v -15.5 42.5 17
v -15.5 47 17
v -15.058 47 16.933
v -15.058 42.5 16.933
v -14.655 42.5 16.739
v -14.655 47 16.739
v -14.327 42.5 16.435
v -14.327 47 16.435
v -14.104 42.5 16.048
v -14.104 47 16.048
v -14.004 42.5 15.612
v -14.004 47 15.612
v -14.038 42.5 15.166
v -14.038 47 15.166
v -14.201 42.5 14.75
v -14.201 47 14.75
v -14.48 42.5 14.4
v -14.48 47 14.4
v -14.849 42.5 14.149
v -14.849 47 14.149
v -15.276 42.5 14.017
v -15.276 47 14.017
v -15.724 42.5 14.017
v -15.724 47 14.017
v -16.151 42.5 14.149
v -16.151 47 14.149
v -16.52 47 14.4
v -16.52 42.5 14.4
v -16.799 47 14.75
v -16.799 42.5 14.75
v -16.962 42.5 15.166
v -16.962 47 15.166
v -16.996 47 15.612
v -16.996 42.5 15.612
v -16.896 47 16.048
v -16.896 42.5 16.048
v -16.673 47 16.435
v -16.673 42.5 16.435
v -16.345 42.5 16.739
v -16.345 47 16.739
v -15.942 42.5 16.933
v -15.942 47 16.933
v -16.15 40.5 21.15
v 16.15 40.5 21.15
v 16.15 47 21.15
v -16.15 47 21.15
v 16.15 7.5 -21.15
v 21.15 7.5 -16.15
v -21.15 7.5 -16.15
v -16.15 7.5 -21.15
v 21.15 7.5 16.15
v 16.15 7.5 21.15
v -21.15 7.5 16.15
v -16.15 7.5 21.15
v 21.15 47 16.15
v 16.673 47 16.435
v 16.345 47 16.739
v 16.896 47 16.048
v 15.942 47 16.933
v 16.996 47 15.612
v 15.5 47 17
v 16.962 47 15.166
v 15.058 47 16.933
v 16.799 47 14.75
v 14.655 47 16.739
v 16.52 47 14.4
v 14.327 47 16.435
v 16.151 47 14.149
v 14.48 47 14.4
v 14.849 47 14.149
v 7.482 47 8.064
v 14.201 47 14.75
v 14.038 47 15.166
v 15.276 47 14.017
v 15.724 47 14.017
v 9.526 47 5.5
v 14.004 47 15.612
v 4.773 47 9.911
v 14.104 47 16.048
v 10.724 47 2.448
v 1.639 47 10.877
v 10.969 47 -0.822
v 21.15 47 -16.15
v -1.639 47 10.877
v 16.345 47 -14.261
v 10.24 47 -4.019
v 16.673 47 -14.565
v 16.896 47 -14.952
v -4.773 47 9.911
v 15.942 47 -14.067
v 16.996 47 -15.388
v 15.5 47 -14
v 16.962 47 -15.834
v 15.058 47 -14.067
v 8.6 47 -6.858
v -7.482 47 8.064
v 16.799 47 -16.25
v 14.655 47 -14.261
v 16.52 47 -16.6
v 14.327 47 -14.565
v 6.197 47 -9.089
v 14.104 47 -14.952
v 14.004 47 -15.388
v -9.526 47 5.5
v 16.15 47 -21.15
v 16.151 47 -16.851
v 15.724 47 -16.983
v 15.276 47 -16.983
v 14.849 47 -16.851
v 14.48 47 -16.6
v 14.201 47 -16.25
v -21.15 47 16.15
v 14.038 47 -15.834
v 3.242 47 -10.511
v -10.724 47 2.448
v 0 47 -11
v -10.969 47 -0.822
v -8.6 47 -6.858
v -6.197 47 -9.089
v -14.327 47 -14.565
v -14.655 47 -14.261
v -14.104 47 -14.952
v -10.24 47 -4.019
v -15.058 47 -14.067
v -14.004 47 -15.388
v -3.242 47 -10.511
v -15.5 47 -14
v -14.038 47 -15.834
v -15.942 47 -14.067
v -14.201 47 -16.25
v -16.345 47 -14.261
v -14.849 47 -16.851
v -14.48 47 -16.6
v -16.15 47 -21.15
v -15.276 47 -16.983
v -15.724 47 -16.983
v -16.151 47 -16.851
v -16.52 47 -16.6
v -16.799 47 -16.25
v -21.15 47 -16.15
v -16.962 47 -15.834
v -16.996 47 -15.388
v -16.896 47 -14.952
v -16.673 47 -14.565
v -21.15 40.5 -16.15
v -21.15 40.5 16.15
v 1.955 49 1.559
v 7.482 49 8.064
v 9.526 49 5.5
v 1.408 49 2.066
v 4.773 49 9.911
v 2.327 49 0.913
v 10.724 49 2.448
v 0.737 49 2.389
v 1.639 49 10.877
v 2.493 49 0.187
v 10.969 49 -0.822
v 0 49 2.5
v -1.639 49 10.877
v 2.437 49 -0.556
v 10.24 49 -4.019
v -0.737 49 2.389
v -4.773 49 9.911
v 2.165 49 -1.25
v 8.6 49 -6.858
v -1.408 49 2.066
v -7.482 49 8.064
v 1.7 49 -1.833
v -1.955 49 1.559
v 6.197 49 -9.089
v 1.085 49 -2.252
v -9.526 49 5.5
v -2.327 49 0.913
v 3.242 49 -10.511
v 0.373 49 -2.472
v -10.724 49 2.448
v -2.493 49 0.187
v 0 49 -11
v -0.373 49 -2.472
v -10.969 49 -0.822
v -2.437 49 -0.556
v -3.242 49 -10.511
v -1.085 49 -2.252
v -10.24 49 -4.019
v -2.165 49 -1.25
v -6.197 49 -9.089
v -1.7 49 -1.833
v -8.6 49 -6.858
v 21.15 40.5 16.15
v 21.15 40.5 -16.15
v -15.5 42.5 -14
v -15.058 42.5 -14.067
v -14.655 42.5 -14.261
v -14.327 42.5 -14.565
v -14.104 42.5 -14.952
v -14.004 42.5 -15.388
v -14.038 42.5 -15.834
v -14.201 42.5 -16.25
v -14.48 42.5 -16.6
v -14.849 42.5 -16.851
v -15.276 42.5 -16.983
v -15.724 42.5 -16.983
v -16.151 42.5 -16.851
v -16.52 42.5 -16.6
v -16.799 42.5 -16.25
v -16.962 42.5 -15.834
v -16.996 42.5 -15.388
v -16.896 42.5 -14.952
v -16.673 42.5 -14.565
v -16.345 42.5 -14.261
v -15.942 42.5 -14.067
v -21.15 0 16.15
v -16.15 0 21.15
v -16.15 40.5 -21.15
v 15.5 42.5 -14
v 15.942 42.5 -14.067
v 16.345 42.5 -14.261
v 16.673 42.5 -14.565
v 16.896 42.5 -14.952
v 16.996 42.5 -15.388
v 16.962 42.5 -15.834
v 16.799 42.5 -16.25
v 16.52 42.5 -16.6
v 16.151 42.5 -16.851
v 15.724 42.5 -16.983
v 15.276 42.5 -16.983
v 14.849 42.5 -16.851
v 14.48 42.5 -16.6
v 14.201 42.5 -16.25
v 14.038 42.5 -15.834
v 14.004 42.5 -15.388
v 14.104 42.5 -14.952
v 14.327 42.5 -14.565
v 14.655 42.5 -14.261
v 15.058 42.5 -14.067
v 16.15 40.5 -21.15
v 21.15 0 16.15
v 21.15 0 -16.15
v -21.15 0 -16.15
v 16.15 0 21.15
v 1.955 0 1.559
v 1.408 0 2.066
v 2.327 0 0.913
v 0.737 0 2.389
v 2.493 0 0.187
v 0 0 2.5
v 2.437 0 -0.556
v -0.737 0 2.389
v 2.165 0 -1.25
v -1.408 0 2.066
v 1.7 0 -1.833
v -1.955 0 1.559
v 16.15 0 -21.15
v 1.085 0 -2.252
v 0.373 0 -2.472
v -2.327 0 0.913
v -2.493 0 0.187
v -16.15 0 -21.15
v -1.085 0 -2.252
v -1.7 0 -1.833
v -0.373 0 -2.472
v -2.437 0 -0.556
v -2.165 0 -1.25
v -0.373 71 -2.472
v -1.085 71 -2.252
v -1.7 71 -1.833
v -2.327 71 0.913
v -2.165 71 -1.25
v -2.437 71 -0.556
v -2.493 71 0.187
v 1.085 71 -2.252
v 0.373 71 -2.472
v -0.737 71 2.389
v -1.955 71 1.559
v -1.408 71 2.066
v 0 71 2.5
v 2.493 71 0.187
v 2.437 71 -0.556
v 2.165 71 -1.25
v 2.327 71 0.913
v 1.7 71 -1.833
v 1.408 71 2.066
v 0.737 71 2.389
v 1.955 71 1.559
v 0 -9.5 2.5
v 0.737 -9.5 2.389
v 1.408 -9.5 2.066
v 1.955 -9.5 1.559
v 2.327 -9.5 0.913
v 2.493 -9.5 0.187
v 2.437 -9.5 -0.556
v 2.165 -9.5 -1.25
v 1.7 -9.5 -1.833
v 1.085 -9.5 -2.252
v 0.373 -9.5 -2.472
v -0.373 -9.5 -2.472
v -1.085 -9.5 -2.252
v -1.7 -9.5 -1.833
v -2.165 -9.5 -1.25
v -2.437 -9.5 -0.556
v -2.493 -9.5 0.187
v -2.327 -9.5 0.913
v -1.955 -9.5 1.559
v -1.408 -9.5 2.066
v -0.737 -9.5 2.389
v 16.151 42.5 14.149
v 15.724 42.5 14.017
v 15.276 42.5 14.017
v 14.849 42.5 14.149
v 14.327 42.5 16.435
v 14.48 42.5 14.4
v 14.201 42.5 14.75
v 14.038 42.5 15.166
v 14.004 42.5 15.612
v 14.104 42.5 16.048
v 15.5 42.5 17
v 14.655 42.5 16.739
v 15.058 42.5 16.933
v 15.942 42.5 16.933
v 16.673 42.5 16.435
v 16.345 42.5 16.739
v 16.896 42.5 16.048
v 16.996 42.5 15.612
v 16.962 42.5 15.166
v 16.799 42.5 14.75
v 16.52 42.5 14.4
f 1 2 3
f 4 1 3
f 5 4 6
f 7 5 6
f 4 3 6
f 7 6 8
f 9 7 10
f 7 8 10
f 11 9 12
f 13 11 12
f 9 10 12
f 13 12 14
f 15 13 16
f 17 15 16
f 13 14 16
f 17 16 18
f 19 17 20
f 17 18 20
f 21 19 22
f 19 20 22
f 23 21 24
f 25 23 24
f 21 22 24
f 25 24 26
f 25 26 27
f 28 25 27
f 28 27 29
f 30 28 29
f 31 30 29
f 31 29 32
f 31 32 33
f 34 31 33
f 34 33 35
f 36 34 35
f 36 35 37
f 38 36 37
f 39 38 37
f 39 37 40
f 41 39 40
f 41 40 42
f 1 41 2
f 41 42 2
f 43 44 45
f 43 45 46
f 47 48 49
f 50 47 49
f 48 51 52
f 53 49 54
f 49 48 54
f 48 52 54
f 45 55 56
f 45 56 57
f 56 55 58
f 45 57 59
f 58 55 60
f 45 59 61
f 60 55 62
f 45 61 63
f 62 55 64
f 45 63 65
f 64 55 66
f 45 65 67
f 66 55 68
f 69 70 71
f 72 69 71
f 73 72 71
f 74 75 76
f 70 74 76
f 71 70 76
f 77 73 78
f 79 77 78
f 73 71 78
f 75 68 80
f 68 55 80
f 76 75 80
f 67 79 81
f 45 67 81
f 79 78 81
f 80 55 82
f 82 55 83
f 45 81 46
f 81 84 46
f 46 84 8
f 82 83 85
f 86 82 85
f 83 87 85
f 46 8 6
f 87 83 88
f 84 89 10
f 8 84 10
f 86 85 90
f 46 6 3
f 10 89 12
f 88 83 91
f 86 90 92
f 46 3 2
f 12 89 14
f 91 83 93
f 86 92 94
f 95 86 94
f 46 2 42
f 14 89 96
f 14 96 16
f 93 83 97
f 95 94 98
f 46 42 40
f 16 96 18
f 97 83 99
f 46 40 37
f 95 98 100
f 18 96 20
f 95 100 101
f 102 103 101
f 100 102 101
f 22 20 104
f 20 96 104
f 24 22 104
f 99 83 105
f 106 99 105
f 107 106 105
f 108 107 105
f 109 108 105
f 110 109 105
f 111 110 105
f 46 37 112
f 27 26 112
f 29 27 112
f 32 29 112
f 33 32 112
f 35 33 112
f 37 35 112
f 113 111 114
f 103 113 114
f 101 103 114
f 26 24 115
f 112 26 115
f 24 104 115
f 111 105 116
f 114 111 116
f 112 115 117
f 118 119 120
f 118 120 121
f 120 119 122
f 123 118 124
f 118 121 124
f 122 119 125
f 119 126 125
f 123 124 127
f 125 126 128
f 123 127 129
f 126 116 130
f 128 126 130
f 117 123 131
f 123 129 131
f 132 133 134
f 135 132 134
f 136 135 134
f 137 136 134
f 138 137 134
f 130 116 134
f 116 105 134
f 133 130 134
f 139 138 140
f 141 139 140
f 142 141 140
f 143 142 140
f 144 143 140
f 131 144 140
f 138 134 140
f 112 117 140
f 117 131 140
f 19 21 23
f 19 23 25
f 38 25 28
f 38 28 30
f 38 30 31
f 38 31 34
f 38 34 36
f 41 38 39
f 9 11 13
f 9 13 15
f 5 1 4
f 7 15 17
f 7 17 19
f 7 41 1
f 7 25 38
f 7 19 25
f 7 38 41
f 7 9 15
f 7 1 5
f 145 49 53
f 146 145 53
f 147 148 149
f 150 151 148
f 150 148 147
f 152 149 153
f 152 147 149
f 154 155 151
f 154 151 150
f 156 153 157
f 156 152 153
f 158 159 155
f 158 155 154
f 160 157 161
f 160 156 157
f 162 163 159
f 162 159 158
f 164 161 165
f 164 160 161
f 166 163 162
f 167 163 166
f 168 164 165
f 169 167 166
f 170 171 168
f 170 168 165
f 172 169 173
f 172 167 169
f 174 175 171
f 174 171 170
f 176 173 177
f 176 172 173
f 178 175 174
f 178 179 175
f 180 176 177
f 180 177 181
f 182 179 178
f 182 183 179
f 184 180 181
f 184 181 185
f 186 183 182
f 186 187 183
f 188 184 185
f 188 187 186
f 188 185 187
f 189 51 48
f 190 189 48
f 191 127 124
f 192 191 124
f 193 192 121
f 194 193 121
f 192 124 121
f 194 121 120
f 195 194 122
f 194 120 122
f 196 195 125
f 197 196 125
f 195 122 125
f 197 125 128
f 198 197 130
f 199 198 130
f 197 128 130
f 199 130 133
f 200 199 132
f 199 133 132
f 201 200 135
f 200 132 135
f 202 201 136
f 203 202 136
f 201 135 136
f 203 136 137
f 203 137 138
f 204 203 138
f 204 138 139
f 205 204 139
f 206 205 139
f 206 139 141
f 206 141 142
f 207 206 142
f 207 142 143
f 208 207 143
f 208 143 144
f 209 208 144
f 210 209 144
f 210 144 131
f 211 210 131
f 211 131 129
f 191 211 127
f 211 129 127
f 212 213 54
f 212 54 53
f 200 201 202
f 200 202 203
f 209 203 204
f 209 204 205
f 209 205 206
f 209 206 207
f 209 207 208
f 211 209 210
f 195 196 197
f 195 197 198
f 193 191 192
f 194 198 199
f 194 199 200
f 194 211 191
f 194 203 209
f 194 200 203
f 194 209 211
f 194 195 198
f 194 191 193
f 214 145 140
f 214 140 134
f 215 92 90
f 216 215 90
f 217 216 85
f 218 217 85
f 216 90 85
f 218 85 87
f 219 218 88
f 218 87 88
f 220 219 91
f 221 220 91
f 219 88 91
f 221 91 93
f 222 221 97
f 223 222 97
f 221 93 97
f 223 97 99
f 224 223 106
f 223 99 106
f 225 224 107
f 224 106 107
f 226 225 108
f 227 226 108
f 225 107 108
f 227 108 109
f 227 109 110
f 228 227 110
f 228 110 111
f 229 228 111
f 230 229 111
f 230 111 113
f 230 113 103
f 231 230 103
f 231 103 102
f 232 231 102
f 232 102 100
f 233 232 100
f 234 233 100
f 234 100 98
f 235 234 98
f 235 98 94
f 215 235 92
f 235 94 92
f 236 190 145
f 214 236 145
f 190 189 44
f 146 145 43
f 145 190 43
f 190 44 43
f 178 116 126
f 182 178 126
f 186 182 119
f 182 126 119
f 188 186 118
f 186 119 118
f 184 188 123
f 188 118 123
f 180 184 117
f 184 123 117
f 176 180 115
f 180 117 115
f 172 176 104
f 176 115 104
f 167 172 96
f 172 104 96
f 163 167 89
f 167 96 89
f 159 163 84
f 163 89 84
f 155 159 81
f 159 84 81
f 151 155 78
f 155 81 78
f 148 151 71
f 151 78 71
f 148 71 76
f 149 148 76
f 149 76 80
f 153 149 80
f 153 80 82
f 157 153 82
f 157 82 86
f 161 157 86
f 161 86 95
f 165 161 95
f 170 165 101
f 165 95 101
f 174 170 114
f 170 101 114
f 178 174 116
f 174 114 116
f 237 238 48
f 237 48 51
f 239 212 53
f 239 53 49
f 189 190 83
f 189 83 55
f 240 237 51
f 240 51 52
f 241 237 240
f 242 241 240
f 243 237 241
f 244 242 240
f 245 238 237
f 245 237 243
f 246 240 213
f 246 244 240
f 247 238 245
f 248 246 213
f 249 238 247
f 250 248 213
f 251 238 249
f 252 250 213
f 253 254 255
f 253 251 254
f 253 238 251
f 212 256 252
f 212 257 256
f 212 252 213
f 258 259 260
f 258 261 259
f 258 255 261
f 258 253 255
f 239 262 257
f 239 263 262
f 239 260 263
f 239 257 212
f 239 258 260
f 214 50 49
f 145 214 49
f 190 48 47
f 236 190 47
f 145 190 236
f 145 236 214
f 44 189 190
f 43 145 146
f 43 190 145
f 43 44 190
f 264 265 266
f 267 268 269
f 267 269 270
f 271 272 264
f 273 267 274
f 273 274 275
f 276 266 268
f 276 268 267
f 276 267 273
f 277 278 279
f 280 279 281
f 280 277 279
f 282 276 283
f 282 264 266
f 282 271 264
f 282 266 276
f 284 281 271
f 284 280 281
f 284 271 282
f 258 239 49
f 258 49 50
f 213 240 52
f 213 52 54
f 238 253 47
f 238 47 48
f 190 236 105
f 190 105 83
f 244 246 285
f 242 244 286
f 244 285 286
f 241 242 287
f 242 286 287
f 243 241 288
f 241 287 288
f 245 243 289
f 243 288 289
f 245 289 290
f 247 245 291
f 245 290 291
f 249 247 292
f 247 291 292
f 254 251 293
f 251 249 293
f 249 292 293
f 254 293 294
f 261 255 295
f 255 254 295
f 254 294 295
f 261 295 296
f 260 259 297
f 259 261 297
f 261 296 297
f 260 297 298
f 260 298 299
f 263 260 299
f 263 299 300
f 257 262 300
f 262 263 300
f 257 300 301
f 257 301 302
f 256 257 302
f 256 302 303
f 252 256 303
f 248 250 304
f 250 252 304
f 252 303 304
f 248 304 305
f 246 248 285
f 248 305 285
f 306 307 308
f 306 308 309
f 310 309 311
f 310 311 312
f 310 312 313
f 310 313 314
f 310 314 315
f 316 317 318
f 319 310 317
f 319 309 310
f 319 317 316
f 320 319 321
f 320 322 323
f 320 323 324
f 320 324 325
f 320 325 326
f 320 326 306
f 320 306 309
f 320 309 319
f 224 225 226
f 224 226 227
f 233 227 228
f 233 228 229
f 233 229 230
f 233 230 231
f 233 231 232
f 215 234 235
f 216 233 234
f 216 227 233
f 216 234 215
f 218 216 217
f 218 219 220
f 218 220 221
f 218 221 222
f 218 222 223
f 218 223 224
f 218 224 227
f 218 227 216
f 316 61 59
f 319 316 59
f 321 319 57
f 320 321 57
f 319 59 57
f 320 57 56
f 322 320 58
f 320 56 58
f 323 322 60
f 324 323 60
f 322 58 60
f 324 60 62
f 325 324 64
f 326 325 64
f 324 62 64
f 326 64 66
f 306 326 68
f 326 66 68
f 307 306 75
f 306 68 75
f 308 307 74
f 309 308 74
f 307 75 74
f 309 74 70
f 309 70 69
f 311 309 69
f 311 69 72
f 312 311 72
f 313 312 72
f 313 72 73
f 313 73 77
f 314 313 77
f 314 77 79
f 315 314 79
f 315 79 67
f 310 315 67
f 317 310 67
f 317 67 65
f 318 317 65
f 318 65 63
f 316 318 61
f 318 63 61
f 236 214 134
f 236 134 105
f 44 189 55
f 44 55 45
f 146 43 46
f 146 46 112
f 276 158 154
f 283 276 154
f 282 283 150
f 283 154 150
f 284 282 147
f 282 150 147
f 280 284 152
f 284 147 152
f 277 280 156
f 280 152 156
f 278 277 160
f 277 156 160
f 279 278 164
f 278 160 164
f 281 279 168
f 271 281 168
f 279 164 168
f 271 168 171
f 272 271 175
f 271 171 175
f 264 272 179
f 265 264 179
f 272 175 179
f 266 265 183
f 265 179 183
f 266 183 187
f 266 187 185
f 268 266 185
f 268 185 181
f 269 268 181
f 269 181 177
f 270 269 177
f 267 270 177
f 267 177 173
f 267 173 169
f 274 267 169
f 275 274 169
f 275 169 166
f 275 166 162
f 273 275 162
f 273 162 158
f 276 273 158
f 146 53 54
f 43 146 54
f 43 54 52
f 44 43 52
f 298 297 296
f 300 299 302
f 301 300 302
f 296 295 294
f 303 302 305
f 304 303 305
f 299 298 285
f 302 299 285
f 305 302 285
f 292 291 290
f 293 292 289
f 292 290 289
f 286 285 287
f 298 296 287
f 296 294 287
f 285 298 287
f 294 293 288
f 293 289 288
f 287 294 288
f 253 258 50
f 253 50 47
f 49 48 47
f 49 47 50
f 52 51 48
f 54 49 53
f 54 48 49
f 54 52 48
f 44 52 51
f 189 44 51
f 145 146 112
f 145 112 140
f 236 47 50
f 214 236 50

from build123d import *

# Parameters (mm, degrees)
EXTRUDE1_DEPTH      = 47
SKETCH2_R           = 11
EXTRUDE2_DEPTH      = 2
EXTRUDE3_START      = -9.5
SKETCH3_R           = 2.5
EXTRUDE3_DEPTH      = 80.5
SKETCH4_R           = 1.5
EXTRUDE4_DEPTH      = 4.5
CUT_EXTRUDE_3_DEPTH = 33
EXTRUDE_4_DEPTH     = 33


with BuildPart() as part:
    # Sketch1 → Extrude1 (new body)
    with BuildSketch(Plane(origin=(0, 0, 0), x_dir=(1, 0, 0), z_dir=(0, 1, 0))):
        Polygon((16.15, 21.15), (21.15, 16.15), (21.15, -16.15), (16.15, -21.15), (-16.15, -21.15), (-21.15, -16.15), (-21.15, 16.15), (-16.15, 21.15), align=None)
    extrude(amount=EXTRUDE1_DEPTH)

    # Sketch2 → Extrude2 (add)
    with BuildSketch(Plane(origin=(0, 47, 0), x_dir=(1, 0, 0), z_dir=(0, 1, 0))):
        with Locations(Location((0, 0, 0), (0, 0, 90))):
            Circle(SKETCH2_R)
    extrude(amount=EXTRUDE2_DEPTH)

    # Sketch3 → Extrude3 (add)
    with BuildSketch(Plane(origin=(0, 0, 0), x_dir=(1, 0, 0), z_dir=(0, 1, 0)).offset(EXTRUDE3_START)):
        with Locations(Location((0, 0, 0), (0, 0, 270))):
            Circle(SKETCH3_R)
    extrude(amount=EXTRUDE3_DEPTH)

    # Sketch4 → Extrude4 (cut)
    with BuildSketch(Plane(origin=(0, 47, 0), x_dir=(1, 0, 0), z_dir=(0, 1, 0))):
        with Locations(Location((-15.5, 15.5, 0), (0, 0, 270))):
            Circle(SKETCH4_R)
        with Locations(Location((15.5, 15.5, 0), (0, 0, 270))):
            Circle(SKETCH4_R)
        with Locations(Location((-15.5, -15.5, 0), (0, 0, 270))):
            Circle(SKETCH4_R)
        with Locations(Location((15.5, -15.5, 0), (0, 0, 270))):
            Circle(SKETCH4_R)
    extrude(amount=-EXTRUDE4_DEPTH, mode=Mode.SUBTRACT)

    # Эскиз2 → Вытянуть3 (cut)
    with BuildSketch(Plane.XZ.offset(-7.5)):
        Polygon((-21.15, 16.15), (-16.15, 21.15), (16.15, 21.15), (21.15, 16.15), (21.15, -16.15), (16.15, -21.15), (-16.15, -21.15), (-21.15, -16.15), align=None)
    extrude(amount=-CUT_EXTRUDE_3_DEPTH, mode=Mode.SUBTRACT)


with BuildPart() as cut_extrude_3_piece_1:
    # of the separate pieces the step leaves, piece 1, a body of its own (cut_extrude_3_pieces)
    add(part.part.solids().sort_by_distance((16.15, 0, -21.15))[0])


with BuildPart() as cut_extrude_3_piece_2:
    # of the separate pieces the step leaves, piece 2, a body of its own (cut_extrude_3_pieces)
    add(part.part.solids().sort_by_distance((21.15, 40.5, -16.15))[0])


with BuildPart() as body_3:
    # Эскиз3 → Вытянуть4 (new body)
    with BuildSketch(Plane.XZ.offset(-7.5)):
        Polygon((-21.15, 16.15), (-16.15, 21.15), (16.15, 21.15), (21.15, 16.15), (21.15, -16.15), (16.15, -21.15), (-16.15, -21.15), (-21.15, -16.15), align=None)
    extrude(amount=-EXTRUDE_4_DEPTH)


solid = Compound([cut_extrude_3_piece_1.part, cut_extrude_3_piece_2.part, body_3.part])
